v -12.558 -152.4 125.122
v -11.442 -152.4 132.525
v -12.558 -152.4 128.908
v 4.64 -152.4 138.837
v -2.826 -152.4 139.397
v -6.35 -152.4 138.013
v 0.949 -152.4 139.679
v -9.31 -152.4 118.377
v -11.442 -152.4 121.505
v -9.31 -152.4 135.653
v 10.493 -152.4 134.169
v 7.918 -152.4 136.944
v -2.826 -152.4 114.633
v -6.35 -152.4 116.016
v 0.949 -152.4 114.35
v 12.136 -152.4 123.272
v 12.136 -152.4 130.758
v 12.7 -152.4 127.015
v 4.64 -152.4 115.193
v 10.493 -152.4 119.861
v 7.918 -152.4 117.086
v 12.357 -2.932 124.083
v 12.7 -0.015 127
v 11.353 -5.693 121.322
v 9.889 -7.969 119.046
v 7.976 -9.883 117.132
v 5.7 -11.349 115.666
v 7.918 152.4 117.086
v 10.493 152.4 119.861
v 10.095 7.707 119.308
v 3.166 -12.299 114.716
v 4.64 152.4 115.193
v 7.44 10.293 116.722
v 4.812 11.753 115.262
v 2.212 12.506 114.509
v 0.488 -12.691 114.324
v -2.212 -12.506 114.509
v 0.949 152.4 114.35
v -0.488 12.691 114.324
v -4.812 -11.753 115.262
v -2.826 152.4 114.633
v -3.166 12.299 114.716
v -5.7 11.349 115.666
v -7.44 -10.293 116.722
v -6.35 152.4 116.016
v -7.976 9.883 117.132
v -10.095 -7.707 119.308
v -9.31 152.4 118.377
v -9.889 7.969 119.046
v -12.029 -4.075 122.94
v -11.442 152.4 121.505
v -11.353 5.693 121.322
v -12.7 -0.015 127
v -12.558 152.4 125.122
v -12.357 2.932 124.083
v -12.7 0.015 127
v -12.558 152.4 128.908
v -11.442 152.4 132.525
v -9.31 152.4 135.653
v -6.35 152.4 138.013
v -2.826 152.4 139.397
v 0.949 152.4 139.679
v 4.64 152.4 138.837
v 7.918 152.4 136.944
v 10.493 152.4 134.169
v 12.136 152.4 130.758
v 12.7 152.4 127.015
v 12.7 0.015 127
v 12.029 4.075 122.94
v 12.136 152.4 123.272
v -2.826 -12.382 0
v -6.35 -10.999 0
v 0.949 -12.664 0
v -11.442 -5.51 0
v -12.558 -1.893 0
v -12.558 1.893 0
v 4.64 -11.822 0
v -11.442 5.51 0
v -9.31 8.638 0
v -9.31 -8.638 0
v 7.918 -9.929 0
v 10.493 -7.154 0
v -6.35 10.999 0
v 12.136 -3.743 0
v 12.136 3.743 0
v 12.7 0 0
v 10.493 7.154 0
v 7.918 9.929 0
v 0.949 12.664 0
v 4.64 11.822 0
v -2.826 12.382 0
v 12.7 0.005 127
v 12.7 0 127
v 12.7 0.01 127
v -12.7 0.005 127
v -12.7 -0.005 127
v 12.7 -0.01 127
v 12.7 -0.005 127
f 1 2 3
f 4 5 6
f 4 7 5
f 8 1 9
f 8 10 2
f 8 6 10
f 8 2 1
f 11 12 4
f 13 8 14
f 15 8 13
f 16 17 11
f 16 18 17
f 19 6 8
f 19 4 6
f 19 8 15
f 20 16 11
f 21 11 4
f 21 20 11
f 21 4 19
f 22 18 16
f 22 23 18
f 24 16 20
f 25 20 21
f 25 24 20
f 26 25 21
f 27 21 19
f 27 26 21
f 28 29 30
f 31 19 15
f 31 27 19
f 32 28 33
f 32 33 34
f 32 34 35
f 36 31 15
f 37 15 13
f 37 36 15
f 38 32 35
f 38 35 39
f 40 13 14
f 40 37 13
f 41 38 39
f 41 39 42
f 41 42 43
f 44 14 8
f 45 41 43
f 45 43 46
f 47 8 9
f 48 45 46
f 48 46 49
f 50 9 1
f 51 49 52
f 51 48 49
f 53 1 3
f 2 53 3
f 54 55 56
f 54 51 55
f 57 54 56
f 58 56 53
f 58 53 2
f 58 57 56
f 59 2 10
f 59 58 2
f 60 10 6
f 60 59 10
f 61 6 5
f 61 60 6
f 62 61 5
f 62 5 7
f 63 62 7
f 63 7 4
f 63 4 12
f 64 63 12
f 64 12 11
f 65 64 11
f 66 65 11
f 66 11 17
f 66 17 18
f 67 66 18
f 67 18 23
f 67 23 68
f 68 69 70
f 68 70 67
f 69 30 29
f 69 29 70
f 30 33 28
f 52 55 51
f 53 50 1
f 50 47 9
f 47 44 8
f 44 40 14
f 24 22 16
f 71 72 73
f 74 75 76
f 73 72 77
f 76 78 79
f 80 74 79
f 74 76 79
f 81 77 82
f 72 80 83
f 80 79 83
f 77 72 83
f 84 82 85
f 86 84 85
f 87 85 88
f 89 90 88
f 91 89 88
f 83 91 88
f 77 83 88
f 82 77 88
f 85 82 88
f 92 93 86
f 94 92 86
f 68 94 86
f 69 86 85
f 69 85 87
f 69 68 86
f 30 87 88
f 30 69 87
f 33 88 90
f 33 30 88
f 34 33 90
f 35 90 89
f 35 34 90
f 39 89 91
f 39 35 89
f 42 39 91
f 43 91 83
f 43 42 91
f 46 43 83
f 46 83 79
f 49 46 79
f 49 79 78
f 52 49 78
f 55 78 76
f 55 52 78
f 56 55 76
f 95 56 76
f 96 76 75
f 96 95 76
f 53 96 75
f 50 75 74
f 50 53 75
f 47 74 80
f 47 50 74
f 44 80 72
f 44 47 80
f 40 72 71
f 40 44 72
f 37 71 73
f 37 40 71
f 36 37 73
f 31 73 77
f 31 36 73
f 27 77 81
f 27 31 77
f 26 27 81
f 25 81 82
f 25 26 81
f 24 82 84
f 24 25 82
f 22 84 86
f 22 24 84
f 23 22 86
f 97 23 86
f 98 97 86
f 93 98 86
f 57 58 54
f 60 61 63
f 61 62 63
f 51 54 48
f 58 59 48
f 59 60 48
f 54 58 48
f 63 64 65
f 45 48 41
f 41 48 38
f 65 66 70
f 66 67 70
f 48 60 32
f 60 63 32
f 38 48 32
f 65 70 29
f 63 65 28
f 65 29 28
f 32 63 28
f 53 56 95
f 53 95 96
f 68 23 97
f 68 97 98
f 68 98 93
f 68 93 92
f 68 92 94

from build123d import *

# Parameters (mm, degrees)
F0_R = 12.7
F6_R = 12.7


with BuildPart() as f4:
    # F4: sweep along a path in F1
    with BuildLine(Plane.YZ) as f4_path:
        Line((0, 0), (0, 127))
    # F0 (on Top) → F4 (sweep)
    with BuildSketch(Plane.XY):
        Circle(F0_R)
    sweep(path=f4_path.line)

    # F7: sweep along a path in F3
    with BuildLine(Plane.XY.offset(127)) as f7_path:
        Line((0, -152.4), (0, 0))
        Line((0, 0), (0, 152.4))
    # F6 (on face) → F7 (sweep)
    with BuildSketch(Plane.XZ.offset(152.4)):
        with Locations((0, 127.014965)):
            Circle(F6_R)
    sweep(path=f7_path.line)


solid = f4.part
